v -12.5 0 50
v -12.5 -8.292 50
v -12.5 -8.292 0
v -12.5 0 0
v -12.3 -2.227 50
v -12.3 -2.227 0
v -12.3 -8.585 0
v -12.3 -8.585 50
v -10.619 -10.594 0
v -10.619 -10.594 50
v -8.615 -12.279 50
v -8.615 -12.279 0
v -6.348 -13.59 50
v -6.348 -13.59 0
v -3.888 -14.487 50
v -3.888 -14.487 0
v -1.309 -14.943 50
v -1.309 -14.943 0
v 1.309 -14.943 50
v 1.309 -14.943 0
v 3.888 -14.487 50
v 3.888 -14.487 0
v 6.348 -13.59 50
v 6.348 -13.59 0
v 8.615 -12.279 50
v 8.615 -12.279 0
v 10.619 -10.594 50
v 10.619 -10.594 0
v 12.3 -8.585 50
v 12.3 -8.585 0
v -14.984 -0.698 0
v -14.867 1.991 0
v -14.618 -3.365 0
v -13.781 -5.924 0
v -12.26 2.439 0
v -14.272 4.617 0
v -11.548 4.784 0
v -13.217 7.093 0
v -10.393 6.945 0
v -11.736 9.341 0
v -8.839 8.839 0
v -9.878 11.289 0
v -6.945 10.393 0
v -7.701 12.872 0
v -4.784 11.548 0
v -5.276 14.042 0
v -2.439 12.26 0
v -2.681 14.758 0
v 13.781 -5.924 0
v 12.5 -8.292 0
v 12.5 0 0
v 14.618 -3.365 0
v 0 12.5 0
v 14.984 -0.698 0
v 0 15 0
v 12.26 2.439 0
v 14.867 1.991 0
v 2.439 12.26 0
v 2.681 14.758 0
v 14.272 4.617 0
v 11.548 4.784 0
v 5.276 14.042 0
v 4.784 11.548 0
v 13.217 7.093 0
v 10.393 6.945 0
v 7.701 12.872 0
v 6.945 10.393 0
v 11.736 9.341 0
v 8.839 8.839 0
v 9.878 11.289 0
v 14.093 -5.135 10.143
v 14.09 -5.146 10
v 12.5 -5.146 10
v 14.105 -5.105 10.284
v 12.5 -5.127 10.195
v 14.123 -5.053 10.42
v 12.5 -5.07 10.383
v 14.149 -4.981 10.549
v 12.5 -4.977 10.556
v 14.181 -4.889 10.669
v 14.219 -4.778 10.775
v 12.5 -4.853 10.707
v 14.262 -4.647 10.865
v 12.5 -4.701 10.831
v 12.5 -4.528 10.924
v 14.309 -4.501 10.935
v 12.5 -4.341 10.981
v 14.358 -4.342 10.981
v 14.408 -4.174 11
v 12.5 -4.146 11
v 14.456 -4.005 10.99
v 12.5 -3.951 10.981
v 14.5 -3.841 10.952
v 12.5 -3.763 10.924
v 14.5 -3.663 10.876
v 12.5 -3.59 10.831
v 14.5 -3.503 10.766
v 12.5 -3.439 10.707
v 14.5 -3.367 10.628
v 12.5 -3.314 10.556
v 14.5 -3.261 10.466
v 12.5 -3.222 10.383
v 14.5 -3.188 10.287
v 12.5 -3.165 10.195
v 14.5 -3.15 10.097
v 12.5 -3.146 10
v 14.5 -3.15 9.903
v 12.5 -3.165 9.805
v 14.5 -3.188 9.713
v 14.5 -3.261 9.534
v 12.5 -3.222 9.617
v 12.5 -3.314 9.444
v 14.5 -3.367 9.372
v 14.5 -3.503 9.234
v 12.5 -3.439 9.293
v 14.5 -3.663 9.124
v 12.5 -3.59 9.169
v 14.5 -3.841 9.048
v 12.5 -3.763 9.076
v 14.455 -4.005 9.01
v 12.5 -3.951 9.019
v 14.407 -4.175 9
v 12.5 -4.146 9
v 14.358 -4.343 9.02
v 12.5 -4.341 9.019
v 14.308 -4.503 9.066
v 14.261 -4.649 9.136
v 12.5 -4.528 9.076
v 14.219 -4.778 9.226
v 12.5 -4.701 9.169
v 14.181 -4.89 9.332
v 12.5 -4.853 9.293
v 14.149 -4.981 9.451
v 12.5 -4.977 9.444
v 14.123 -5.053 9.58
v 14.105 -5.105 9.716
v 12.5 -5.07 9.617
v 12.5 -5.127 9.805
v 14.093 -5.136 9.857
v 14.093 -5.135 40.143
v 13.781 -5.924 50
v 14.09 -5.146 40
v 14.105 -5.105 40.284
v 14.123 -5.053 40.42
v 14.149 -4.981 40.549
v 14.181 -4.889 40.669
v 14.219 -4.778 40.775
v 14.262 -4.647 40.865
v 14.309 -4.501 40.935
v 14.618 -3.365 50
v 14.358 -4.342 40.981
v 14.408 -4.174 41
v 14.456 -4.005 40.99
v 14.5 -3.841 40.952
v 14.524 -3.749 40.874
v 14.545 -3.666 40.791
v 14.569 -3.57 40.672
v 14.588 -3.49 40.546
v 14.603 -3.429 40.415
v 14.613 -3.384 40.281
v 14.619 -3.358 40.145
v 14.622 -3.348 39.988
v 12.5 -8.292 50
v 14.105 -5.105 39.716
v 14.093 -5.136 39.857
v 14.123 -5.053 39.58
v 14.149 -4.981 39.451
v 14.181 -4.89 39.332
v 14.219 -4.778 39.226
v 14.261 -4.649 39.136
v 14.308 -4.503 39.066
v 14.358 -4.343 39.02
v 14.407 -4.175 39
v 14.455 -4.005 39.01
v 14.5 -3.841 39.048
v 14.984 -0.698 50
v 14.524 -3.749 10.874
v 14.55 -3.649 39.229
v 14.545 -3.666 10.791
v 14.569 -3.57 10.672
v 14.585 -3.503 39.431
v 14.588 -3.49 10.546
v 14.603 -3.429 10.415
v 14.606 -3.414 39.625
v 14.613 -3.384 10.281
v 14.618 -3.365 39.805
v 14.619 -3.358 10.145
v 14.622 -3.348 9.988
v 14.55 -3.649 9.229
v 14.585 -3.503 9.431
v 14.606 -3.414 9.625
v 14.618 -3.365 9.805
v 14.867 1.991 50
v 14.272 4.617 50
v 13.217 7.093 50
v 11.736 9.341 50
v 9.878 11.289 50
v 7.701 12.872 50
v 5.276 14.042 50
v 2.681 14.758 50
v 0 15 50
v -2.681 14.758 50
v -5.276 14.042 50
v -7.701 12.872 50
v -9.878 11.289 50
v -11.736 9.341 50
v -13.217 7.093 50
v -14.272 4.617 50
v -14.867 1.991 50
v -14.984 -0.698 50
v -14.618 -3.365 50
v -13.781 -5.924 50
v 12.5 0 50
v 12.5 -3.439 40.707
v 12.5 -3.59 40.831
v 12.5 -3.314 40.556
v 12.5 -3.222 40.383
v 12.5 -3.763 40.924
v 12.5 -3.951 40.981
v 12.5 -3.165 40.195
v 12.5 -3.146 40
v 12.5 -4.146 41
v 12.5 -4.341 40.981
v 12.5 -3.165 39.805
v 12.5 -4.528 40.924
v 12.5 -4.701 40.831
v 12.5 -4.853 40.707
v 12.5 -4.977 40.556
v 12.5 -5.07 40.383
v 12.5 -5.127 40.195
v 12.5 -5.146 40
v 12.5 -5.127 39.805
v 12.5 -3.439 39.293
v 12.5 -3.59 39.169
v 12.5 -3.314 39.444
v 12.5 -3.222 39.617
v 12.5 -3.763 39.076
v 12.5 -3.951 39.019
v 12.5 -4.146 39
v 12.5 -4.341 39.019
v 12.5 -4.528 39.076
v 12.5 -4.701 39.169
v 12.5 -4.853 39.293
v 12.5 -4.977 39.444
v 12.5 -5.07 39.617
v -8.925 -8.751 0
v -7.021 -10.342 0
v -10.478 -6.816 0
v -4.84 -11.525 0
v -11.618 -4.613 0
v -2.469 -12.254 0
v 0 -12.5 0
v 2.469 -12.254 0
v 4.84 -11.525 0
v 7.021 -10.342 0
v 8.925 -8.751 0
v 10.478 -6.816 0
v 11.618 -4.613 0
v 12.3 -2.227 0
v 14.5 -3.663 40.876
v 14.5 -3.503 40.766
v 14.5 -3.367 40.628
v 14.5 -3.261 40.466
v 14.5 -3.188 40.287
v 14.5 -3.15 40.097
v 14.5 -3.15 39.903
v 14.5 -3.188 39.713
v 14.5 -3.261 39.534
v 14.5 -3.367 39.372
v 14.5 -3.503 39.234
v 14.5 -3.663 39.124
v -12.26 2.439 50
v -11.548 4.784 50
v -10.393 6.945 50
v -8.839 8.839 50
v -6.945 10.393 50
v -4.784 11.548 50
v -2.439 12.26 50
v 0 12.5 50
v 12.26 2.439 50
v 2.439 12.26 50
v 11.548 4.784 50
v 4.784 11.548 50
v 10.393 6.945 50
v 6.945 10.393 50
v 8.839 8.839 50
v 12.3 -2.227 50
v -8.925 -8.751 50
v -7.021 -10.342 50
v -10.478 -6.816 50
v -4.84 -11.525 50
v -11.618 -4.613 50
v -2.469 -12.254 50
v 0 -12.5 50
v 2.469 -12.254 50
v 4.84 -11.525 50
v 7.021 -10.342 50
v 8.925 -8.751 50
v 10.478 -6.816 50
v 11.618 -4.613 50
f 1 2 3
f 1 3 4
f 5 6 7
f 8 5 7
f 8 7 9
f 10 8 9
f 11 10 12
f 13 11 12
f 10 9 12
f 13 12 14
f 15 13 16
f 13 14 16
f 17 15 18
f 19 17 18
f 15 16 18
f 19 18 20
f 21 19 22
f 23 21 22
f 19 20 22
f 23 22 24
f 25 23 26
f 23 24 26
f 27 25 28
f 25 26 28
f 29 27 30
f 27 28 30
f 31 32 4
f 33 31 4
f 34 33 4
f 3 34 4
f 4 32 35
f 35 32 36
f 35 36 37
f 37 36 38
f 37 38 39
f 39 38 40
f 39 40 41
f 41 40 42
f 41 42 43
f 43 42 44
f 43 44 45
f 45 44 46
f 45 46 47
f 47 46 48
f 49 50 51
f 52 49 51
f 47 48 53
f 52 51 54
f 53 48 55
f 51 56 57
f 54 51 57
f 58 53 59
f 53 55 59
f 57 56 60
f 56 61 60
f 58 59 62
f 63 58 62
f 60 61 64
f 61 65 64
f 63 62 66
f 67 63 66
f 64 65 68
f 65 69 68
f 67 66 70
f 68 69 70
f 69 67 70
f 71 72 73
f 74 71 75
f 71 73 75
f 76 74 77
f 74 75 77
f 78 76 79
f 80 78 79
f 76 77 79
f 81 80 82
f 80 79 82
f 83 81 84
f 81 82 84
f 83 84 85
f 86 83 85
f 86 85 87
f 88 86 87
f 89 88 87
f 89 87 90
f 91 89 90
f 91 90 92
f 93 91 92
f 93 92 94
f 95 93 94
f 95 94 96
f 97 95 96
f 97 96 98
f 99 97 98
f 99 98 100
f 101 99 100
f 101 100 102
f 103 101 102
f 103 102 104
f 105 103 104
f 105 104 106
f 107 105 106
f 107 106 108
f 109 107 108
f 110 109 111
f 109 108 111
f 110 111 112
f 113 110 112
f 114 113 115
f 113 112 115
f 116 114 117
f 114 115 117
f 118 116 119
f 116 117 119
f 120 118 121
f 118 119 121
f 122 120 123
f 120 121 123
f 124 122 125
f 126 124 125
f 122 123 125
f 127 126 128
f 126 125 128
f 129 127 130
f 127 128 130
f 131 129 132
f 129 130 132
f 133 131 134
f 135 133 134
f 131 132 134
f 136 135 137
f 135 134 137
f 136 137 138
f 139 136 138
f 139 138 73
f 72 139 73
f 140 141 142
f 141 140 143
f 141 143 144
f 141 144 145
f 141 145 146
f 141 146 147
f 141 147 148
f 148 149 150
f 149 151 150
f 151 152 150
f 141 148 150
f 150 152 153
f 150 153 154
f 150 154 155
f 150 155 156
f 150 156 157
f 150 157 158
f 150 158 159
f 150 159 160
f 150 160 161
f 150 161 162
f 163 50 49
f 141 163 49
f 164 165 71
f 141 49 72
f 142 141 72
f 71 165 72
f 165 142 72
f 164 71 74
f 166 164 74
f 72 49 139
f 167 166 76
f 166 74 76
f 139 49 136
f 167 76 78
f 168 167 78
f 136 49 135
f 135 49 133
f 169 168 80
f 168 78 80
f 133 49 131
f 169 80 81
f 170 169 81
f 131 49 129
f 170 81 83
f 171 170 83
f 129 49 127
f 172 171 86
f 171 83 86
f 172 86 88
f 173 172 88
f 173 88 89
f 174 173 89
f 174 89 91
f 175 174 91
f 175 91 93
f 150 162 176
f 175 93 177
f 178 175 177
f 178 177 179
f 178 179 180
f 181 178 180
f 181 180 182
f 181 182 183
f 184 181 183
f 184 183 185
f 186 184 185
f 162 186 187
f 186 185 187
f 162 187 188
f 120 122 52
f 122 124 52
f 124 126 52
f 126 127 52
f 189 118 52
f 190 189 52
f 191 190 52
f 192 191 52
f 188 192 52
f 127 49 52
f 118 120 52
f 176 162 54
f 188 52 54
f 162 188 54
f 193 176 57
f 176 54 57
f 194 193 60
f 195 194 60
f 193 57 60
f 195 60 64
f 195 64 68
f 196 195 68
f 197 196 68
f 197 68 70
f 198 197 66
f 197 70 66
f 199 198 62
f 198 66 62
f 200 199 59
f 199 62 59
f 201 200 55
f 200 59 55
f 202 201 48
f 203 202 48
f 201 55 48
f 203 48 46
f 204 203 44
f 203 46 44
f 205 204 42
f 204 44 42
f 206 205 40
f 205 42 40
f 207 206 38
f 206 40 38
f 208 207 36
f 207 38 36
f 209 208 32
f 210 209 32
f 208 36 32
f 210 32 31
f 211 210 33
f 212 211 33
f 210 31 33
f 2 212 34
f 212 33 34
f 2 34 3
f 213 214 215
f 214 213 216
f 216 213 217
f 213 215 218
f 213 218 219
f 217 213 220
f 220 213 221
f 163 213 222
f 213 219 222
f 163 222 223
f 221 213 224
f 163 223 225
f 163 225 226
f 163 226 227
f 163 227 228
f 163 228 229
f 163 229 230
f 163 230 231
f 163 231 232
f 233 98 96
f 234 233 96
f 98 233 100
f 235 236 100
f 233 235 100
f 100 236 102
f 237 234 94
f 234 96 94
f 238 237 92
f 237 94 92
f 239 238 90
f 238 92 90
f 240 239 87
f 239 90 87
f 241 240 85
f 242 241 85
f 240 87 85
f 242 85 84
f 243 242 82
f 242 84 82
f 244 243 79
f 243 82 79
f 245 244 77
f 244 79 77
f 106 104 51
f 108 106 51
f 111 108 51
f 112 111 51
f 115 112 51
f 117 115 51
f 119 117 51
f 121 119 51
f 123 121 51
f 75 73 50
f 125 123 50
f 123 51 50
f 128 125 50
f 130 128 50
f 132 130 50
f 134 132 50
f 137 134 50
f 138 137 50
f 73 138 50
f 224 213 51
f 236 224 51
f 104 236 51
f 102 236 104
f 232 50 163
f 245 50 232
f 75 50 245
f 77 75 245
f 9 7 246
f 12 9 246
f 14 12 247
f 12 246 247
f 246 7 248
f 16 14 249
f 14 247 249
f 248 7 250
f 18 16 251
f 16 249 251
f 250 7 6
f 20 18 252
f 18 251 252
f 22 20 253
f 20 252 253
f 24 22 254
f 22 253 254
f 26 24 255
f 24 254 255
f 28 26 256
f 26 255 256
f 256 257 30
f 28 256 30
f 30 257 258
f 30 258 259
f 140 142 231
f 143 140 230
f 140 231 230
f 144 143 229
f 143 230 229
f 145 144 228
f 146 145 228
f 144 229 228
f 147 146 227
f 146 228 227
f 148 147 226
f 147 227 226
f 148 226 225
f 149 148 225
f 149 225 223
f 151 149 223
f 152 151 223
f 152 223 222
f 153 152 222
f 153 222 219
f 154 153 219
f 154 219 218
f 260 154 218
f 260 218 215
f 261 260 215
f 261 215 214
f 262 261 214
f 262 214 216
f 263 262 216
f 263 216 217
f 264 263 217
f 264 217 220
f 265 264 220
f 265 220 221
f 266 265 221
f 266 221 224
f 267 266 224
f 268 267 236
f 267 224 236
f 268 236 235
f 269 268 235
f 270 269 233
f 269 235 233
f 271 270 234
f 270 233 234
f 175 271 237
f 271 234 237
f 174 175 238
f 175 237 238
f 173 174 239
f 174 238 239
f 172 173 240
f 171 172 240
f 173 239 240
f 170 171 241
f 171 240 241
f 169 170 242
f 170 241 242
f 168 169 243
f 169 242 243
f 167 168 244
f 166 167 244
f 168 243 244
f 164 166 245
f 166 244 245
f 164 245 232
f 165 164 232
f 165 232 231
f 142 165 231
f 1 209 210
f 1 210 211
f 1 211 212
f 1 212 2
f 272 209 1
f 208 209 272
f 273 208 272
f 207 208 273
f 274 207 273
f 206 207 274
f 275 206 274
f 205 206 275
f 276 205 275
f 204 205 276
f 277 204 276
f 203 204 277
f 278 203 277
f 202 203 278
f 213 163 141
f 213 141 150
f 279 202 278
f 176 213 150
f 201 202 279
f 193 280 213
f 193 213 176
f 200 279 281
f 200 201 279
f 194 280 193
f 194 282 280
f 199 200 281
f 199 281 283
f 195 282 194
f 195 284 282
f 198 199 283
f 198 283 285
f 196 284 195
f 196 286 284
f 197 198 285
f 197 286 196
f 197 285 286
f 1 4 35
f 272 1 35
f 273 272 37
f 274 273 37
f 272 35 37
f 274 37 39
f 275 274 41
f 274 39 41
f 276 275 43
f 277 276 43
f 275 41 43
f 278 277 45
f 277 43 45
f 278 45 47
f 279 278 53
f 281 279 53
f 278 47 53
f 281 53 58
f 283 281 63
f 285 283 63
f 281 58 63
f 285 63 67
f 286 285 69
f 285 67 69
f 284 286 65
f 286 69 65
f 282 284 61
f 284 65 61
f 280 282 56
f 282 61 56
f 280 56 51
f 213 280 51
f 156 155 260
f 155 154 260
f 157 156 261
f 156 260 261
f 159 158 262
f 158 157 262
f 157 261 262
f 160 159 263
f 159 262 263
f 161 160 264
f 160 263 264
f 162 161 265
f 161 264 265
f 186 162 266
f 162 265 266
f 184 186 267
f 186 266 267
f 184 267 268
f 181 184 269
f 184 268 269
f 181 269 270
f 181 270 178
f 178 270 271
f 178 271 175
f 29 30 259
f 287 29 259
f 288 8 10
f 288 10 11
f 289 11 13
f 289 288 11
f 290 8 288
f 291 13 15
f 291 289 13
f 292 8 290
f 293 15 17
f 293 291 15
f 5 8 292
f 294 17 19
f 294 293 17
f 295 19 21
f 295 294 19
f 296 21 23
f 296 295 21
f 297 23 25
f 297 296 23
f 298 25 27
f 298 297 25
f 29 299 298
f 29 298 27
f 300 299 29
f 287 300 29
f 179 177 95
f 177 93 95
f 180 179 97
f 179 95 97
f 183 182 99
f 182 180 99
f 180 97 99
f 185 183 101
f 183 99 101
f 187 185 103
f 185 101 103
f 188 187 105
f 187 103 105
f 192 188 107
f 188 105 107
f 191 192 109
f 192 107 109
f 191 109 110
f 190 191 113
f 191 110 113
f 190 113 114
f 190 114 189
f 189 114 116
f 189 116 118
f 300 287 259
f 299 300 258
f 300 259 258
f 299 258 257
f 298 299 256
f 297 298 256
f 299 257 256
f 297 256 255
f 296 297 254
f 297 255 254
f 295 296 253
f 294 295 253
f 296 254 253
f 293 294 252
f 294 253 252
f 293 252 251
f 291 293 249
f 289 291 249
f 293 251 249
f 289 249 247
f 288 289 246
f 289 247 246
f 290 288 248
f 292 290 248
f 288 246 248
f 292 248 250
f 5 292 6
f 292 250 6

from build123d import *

# Parameters (mm, degrees)
F1_DEPTH = 50
F3_DEPTH = 50
F5_D     = 2
F5_DEPTH = 2
F5_TIP   = 0.600860619


with BuildPart() as f1:
    # F0 (on Top) → F1 (new body)
    with BuildSketch(Plane.XY):
        with BuildLine():
            Line((12.5, 0), (12.5, -8.2915619759))
            ThreePointArc((12.5, -8.2915619759), (0, 15), (-12.5, -8.2915619759))
            Line((-12.5, -8.2915619759), (-12.5, 0))
            ThreePointArc((-12.5, 0), (0, 12.5), (12.5, 0))
        make_face()
    extrude(amount=F1_DEPTH)

    # F5 (one way)
    with BuildSketch(Plane(origin=(12.5, 0, 0), x_dir=(0, -1, 0), z_dir=(-1, 0, 0))):
        with Locations((4.1457809879, 40), (4.1457809879, 10)):
            Circle(F5_D / 2)
    extrude(amount=-F5_DEPTH, mode=Mode.SUBTRACT)
    with Locations(Plane(origin=(12.5, 0, 0), x_dir=(0, -1, 0), z_dir=(-1, 0, 0))):
        with Locations((4.1457809879, 40), (4.1457809879, 10)):
            with Locations((0, 0, -(F5_DEPTH + F5_TIP / 2))):  # 118° drill point
                Cone(0, F5_D / 2, F5_TIP, mode=Mode.SUBTRACT)


with BuildPart() as f3:
    # F2 (on Top) → F3 (new body)
    with BuildSketch(Plane.XY):
        with BuildLine():
            Line((-12.3, -2.2271057451), (-12.3, -8.5854528128))
            ThreePointArc((-12.3, -8.5854528128), (0, -15), (12.3, -8.5854528128))
            Line((12.3, -8.5854528128), (12.3, -2.2271057451))
            ThreePointArc((12.3, -2.2271057451), (0, -12.5), (-12.3, -2.2271057451))
        make_face()
    extrude(amount=F3_DEPTH)


solid = Compound([f1.part, f3.part])
